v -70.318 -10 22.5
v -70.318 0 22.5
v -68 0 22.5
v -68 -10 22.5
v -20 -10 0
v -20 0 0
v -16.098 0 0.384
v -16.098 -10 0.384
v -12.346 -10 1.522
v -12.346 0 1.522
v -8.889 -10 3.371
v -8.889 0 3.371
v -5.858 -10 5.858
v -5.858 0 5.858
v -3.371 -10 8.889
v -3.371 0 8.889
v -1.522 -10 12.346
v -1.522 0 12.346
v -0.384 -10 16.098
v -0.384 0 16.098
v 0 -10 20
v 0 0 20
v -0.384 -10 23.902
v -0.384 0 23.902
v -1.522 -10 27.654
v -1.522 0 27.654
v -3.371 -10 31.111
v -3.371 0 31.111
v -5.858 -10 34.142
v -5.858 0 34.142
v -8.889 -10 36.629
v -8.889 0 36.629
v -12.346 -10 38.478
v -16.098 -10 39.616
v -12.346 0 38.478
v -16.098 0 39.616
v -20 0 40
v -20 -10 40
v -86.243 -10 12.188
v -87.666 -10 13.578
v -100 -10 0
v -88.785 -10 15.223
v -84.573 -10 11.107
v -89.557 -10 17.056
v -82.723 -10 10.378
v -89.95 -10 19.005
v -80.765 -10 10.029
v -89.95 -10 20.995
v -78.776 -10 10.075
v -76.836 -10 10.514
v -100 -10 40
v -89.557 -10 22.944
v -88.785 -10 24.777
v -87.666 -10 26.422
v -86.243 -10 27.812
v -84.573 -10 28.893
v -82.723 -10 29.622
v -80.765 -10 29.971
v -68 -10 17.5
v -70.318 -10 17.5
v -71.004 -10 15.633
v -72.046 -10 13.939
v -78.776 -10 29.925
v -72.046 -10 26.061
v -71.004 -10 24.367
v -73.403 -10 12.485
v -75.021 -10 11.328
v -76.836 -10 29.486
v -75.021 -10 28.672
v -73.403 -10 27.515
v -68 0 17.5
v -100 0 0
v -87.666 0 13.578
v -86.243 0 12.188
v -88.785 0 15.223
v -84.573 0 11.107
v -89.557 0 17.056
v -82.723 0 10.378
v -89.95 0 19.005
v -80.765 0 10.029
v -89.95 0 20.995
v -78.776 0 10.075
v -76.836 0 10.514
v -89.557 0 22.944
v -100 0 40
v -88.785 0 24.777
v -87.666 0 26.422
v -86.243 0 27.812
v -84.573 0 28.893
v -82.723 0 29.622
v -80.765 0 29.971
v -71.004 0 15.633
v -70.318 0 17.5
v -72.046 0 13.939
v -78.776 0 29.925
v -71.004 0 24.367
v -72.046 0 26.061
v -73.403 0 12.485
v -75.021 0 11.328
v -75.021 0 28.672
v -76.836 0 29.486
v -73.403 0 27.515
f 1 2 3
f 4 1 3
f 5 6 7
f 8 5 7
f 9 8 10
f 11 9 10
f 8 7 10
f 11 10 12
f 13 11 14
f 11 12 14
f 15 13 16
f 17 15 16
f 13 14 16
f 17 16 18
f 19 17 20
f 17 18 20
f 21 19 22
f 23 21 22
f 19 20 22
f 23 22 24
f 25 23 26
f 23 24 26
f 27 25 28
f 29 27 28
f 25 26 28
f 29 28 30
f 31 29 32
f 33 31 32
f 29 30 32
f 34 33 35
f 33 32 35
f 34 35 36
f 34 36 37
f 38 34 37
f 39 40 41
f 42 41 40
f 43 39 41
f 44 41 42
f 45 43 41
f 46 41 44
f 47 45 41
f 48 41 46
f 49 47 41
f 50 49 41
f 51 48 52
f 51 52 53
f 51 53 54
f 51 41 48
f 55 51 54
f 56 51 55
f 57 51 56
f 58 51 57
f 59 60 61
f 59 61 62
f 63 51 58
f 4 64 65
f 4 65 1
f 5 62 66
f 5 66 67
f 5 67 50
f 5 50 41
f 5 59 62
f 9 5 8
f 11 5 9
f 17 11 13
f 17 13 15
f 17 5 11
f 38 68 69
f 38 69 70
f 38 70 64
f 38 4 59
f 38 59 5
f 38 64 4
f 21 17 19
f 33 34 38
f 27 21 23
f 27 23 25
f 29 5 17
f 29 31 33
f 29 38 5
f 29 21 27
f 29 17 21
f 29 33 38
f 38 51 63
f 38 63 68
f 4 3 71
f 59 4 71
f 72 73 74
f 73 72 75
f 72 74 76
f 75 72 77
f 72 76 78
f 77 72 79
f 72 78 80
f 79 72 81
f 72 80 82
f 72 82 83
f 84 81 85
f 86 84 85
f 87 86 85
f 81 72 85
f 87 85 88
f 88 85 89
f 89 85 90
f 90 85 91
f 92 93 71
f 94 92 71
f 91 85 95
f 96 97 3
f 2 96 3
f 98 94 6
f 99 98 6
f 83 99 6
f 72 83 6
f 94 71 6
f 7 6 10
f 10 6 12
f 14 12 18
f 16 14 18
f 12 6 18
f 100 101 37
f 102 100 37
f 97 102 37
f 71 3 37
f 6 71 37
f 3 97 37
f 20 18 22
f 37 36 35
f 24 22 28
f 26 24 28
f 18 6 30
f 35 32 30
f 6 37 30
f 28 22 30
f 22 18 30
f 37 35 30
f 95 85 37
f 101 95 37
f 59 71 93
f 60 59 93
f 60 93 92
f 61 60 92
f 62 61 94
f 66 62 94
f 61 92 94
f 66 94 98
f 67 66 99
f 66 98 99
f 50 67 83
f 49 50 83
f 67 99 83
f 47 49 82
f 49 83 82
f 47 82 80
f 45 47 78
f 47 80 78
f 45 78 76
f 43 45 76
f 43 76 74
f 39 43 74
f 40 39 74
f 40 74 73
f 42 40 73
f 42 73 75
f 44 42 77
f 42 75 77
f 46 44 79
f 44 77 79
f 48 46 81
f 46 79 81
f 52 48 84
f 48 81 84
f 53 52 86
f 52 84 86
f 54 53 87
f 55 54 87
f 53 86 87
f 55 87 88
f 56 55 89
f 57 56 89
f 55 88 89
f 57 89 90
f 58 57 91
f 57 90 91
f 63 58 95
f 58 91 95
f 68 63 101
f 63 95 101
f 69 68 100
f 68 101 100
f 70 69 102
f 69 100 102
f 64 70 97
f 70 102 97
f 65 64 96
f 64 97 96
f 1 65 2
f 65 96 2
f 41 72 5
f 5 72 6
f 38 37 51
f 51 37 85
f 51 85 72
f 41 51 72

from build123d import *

# Parameters (mm, degrees)
F1_DEPTH = 10


with BuildPart() as f1:
    # F0 (on Front) → F1 (new body)
    with BuildSketch(Plane.XZ):
        with BuildLine():
            Line((-100, 0), (-20, 0))
            ThreePointArc((-20, 0), (0, 20), (-20, 40))
            Line((-20, 40), (-100, 40))
            Line((-100, 40), (-100, 0))
        make_face()
        with BuildLine():
            ThreePointArc((-70.317542, 17.5), (-90, 20), (-70.317542, 22.5))
            Line((-70.317542, 22.5), (-68, 22.5))
            Line((-68, 22.5), (-68, 20))
            Line((-68, 20), (-68, 17.5))
            Line((-68, 17.5), (-70.317542, 17.5))
        make_face(mode=Mode.SUBTRACT)
    extrude(amount=F1_DEPTH)


solid = f1.part
